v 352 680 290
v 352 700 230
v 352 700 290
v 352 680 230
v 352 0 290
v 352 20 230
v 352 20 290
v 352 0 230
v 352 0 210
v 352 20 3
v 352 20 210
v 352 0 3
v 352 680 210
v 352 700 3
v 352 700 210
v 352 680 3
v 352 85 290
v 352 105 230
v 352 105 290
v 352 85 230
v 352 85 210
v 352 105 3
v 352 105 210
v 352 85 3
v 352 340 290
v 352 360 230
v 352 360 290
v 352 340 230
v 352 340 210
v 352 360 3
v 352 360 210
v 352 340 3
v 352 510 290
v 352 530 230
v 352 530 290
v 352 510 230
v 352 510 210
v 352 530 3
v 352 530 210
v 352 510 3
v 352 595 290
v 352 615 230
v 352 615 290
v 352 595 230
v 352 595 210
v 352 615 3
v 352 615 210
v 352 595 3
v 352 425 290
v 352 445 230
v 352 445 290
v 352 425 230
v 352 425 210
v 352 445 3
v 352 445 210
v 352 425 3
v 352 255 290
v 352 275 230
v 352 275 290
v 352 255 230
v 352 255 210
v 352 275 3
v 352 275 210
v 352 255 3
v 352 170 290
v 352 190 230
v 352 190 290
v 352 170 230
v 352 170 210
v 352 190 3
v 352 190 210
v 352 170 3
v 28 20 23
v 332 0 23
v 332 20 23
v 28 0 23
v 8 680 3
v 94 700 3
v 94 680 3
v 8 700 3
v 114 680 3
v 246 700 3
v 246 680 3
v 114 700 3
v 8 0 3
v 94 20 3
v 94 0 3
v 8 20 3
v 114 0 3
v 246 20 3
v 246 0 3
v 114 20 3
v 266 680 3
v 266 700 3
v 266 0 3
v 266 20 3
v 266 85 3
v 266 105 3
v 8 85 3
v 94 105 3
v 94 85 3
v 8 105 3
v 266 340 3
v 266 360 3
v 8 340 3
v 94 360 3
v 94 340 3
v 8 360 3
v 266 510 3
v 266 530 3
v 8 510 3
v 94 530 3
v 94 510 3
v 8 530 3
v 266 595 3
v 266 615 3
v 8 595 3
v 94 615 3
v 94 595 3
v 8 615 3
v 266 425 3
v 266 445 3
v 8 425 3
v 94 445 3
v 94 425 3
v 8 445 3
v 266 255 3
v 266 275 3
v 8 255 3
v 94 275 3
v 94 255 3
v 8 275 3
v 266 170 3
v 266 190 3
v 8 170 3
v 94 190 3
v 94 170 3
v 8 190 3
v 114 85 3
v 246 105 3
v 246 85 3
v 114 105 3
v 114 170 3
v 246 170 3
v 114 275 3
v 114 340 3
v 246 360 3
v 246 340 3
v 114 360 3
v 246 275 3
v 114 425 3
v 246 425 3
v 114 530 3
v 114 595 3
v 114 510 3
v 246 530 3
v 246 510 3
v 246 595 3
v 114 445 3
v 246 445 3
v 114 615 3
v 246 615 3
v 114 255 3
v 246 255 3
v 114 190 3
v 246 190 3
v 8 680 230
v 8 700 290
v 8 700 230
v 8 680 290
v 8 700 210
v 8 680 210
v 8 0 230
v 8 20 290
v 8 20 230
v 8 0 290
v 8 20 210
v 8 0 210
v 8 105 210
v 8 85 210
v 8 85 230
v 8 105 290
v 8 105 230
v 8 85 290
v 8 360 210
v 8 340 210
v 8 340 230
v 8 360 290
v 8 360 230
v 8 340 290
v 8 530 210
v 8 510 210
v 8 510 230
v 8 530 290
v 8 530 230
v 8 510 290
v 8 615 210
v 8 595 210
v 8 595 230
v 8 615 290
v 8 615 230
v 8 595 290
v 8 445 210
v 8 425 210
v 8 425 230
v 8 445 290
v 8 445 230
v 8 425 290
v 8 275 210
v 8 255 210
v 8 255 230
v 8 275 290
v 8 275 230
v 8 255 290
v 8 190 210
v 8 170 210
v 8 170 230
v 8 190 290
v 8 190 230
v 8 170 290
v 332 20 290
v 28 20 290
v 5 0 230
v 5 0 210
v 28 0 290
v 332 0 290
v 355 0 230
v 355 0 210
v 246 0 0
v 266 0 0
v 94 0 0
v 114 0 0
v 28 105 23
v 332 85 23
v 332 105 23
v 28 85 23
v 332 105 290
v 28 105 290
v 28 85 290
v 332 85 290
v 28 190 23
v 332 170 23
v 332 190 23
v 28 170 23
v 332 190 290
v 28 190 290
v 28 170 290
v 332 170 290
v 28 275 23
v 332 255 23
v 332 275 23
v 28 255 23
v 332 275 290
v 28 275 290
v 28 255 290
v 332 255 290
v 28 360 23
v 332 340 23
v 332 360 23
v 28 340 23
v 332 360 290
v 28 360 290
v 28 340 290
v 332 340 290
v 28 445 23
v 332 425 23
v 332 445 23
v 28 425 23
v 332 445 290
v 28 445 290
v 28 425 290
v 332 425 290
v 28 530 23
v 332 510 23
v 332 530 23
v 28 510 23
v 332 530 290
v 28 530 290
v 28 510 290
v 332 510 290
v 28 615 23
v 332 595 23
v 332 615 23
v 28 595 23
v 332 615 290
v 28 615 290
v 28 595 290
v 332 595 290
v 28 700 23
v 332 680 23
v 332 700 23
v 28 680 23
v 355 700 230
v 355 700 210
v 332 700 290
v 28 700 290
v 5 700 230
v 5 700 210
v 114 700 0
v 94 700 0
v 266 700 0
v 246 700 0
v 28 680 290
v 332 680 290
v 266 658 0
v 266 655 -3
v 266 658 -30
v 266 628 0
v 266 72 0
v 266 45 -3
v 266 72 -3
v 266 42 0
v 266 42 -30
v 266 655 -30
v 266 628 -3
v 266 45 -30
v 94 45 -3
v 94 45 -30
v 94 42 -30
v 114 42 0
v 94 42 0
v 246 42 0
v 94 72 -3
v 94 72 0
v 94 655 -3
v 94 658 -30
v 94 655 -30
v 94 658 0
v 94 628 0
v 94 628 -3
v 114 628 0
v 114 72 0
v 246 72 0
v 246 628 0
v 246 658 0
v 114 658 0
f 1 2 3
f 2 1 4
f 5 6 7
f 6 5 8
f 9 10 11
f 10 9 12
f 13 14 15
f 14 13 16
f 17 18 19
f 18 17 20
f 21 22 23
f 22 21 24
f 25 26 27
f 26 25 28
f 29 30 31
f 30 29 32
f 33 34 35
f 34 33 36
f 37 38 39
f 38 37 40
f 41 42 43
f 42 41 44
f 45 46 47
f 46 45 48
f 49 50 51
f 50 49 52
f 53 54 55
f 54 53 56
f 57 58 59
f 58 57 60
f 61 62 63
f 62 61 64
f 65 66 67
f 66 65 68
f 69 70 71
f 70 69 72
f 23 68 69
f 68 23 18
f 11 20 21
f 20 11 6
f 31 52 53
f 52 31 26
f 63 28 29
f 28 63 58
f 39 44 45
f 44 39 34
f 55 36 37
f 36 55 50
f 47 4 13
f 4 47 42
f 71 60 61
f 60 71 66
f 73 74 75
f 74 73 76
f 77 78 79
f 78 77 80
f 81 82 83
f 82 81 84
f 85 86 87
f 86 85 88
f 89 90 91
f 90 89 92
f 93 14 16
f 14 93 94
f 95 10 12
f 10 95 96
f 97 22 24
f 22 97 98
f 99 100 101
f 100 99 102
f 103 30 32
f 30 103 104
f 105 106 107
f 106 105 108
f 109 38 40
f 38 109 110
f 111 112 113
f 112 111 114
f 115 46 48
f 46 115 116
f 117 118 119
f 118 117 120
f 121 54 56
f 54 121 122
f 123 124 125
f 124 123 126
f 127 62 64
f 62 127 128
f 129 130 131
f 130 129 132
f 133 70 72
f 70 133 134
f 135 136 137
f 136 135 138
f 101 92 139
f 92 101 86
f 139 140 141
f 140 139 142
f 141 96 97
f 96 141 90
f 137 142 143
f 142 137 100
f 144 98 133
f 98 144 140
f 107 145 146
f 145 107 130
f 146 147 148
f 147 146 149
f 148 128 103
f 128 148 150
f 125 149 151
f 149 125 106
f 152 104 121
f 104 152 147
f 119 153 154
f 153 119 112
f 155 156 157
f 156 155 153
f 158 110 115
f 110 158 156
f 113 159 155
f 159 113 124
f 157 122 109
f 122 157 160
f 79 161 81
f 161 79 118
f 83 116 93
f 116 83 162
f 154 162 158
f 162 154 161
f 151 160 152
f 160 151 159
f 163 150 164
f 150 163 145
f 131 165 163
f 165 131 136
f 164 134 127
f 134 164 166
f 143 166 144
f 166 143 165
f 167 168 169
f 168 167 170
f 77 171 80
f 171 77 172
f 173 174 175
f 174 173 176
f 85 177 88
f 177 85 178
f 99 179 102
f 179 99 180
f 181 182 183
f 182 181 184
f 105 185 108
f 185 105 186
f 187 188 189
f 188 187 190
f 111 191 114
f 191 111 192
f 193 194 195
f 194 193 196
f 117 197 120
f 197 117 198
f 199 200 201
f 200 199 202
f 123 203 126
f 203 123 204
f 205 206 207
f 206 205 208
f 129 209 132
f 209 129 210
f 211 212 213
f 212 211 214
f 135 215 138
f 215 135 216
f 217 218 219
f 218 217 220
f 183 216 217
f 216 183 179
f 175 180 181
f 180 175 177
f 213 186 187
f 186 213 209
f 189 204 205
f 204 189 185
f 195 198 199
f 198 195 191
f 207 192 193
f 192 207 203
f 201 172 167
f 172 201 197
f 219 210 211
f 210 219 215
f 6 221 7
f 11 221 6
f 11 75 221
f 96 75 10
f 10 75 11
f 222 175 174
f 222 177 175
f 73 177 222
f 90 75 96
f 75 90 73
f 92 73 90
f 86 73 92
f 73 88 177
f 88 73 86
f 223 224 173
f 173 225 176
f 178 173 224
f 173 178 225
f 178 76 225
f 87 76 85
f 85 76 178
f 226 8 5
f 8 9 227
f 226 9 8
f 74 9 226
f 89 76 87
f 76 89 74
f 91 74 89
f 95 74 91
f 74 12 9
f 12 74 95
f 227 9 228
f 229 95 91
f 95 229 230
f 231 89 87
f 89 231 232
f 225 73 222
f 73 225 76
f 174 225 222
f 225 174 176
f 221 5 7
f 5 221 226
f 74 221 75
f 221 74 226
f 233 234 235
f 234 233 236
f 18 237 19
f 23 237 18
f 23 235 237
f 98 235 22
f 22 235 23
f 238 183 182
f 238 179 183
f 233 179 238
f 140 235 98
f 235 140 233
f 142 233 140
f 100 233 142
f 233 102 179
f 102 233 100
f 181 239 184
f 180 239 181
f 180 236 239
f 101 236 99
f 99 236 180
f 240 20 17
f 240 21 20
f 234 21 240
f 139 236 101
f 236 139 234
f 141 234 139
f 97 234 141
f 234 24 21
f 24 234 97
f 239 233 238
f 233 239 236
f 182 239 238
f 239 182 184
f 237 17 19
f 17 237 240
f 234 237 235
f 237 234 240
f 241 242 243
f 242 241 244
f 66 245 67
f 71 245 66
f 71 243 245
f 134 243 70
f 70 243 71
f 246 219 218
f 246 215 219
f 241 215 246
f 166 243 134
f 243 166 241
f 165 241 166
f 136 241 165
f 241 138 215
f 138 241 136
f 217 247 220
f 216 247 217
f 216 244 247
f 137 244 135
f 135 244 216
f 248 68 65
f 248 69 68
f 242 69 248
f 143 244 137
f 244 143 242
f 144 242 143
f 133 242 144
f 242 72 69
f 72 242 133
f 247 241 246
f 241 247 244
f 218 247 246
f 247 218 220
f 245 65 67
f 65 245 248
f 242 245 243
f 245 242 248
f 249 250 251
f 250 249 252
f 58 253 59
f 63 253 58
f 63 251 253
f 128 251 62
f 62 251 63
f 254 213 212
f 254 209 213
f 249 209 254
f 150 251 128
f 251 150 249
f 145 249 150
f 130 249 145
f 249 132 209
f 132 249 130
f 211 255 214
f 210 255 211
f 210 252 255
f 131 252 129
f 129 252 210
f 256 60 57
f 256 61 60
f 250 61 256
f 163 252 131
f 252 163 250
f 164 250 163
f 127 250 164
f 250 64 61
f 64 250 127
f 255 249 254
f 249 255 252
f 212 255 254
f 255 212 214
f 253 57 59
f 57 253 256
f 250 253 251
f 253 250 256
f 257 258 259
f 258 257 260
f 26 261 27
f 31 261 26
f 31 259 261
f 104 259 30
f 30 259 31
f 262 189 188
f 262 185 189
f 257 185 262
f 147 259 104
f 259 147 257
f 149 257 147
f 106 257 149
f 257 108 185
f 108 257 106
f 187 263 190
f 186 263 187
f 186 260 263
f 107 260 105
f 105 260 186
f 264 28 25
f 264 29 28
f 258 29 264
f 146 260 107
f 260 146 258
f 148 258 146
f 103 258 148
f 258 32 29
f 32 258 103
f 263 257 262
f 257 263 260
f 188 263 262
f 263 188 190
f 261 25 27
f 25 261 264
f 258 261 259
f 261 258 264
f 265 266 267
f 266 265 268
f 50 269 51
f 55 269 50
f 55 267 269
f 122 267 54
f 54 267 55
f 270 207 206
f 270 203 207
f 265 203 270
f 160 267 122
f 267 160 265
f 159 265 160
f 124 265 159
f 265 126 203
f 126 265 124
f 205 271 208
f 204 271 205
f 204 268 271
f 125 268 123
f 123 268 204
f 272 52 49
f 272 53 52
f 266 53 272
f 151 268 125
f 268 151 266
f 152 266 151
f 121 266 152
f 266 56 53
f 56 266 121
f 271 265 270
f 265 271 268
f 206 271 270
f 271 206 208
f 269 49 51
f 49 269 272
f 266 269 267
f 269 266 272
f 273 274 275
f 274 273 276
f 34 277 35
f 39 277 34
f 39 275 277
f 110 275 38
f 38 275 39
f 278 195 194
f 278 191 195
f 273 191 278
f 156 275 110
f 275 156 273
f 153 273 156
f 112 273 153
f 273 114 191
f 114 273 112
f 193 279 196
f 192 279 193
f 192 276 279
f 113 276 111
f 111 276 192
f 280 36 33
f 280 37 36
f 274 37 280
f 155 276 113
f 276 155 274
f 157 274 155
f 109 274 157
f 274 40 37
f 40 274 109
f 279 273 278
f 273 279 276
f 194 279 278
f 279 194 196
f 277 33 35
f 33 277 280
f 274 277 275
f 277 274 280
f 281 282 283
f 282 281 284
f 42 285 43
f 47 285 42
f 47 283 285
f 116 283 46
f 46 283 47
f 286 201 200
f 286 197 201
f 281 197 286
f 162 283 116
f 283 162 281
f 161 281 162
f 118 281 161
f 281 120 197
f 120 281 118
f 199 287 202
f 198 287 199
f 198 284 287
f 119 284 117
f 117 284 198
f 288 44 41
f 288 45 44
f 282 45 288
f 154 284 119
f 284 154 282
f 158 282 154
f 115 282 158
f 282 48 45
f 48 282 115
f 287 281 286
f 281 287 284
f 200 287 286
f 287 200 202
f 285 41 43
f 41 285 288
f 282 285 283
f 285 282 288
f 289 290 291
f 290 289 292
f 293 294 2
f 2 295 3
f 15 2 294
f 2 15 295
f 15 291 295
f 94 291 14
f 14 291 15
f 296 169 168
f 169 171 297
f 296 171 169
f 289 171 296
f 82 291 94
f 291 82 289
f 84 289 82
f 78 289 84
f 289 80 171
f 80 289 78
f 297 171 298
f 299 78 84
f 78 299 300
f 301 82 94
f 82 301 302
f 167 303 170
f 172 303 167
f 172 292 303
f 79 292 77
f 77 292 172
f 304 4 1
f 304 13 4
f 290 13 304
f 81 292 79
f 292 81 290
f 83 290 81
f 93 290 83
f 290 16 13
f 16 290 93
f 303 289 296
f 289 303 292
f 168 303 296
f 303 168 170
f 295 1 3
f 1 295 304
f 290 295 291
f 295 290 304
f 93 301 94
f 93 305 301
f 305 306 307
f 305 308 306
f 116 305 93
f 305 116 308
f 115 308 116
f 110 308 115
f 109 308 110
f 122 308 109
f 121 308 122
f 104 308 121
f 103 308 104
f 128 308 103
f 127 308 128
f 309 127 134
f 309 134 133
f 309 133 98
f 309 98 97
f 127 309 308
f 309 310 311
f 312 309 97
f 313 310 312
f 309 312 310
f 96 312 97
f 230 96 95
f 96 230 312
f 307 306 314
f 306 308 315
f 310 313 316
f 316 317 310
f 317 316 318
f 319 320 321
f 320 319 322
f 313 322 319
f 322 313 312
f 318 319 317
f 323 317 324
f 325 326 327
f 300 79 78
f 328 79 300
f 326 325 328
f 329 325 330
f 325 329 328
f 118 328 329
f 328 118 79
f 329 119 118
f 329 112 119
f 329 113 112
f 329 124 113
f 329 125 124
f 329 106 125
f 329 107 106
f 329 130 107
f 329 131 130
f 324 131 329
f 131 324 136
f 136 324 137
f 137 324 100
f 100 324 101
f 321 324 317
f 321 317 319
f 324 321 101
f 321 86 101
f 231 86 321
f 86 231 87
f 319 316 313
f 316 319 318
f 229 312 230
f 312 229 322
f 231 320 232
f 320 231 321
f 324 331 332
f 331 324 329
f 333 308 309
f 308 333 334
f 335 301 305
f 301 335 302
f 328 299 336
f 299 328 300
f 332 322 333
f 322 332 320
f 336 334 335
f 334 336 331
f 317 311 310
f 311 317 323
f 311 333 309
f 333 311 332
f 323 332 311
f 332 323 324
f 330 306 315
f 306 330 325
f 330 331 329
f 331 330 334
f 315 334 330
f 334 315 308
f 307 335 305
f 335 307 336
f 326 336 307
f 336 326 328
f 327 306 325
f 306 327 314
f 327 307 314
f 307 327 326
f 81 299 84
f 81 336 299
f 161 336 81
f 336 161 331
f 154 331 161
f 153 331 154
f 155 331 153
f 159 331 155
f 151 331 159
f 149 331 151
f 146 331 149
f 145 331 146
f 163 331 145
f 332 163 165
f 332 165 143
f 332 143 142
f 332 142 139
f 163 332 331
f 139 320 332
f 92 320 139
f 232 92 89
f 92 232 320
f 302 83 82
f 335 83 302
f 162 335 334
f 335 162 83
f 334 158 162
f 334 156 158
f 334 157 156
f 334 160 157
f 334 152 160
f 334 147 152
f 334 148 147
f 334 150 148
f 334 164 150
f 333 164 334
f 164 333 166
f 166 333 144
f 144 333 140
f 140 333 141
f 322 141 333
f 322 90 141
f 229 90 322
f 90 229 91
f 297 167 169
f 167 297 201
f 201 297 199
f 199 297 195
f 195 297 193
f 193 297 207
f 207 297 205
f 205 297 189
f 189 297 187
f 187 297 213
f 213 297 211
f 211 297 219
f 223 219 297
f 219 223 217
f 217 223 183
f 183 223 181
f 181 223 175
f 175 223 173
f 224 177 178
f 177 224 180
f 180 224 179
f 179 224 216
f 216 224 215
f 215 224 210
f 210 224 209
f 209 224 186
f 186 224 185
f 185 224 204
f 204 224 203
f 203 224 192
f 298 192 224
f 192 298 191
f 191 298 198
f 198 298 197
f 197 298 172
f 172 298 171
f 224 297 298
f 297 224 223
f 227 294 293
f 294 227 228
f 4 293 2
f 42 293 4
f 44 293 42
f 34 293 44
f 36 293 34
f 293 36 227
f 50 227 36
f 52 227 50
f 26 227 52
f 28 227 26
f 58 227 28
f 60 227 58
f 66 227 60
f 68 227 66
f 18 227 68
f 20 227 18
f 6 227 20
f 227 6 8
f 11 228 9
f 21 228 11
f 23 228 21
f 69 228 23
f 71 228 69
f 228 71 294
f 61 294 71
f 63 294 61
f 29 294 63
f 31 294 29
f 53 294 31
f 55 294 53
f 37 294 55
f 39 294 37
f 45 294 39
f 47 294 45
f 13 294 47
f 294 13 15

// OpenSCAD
// file: ../../library/profiles.scad
module lShapeProfile($length, $size, $thickness) {
    cube([$length, $size, $thickness]);
    rotate([90, 0, 0])
    translate([0, 0, -$thickness]) cube([$length, $size, $thickness]);
}


module uShapeProfile($length, $size, $thickness) {
    cube([$length, $size, $thickness]);
    rotate([90, 0, 0])
    translate([0, 0, -$thickness]) cube([$length, $size, $thickness]);

    translate([0, $size, 0])
    rotate([90, 0, 0])
    cube([$length, $size, $thickness]);
}


module squareTubeProfile($length, $size, $thickness) {
    cube([$length, $size, $thickness]);

    rotate([90, 0, 0])
    translate([0, 0, -$thickness])
    cube([$length, $size, $thickness]);

    translate([0, $size, 0])
    rotate([90, 0, 0])
    cube([$length, $size, $thickness]);

    translate([0, 0, $size - $thickness])
    cube([$length, $size, $thickness]);
}
// file: fireBasket.scad
include <./config.scad>
include <../../library/profiles.scad>


basketClearance = 5;
basketFlatIron = 3;
totalClearance = basketClearance + basketFlatIron;
basketFrameGap = 60;
basketProfileSize = profileSize / 2;
basketWidth = fireBasketWidth - (profileSize) - (totalClearance * 2);
basketHeight = fireBasketHeight + (profileSize);

// calculations
idealGap = basketFrameGap + basketProfileSize;
numRips = floor(outerDepth / idealGap);
ripGap = (outerDepth - basketProfileSize) / numRips;


filletWidth = basketWidth - (basketProfileSize * 2) - (totalClearance * 2);
numFillet = floor((filletWidth) / idealGap);
filletGap = (filletWidth - basketProfileSize ) / numFillet;



module fireBasketPartsList() {
    // FireBasket
    echo(str("Nr,Beschreibung,Stück,Länge,Breite,Höhe"));

    echo(str("60,Feuerkorb Seitlich - Vierkantrohr,", numRips * 2, ",", basketHeight - basketFlatIron, ",", basketProfileSize, ",", basketProfileSize));
    echo(str("61,Feuerkorb Unten - Vierkantrohr ,", numRips, ",", basketWidth, ",", basketProfileSize, ",", basketProfileSize));
    echo(str("62,Fillets Vorne und Hinten - Vierkantrohr ,", (numFillet+1) * 2, ",", basketHeight - basketFlatIron - basketProfileSize, ",", basketProfileSize, ",", basketProfileSize));
    echo(str("63,Flachstahl lang ,", 4, ",", outerDepth, ",", basketProfileSize, ",", basketFlatIron));
    echo(str("64,Flachstahl kurz ,", 2, ",", basketWidth + (basketFlatIron * 2), ",", basketProfileSize, ",", basketFlatIron));
    echo(str("64,Winkelprofil - Fixierung ,", 2, ",", basketWidth, ",", 30, ",", 30));
}

module fireBasket() {


    module basketFrame() {

        cube(size = [basketWidth, basketProfileSize, basketProfileSize]);
        cube(size = [basketProfileSize, basketProfileSize, basketHeight - basketFlatIron]);

        translate([basketWidth - basketProfileSize, 0, 0])
        cube(size = [basketProfileSize, basketProfileSize, basketHeight - basketFlatIron]);
    }

    module fillet() {
        translate([0, 0, basketProfileSize])
        cube(size = [basketProfileSize, basketProfileSize, basketHeight - basketFlatIron - basketProfileSize]);
    }


    translate([totalClearance, 0, basketFlatIron]){
        // all frames
        for ( i = [0 : numRips] ){
            stepMove = i * ripGap;
            translate([0, stepMove, 0])
            basketFrame();
        }

        if (!fireBasketFrontOpen) {
            // back fillets
            for ( i = [1 : numFillet] ){
                stepMove = (i * filletGap) + basketProfileSize - (basketProfileSize * 1.5);
                translate([stepMove, 0, 0])
                fillet();
            }

            translate([0, outerDepth - basketProfileSize, 0])
            for ( i = [1 : numFillet] ){
                stepMove = (i * filletGap) + basketProfileSize - (basketProfileSize * 1.5);
                translate([stepMove, 0, 0])
                fillet();
            }
        }

        // flat iron below
        translate([(basketWidth / 4), 0, - basketFlatIron])
        cube(size = [basketProfileSize, outerDepth, basketFlatIron]);
        translate([(basketWidth / 4 * 3) - basketProfileSize, 0, - basketFlatIron])
        cube(size = [basketProfileSize, outerDepth, basketFlatIron]);


        // flat iron sides
        translate([- basketFlatIron, 0, fireBasketHeight - basketFlatIron - (basketProfileSize * 2)])
        cube(size = [basketFlatIron, outerDepth, basketProfileSize]);
        translate([basketWidth, 0, fireBasketHeight - basketFlatIron - (basketProfileSize * 2)])
        cube(size = [basketFlatIron, outerDepth, basketProfileSize]);

        // fixation
        translate([basketWidth / 4, profileSize + 2, - basketFlatIron])
        rotate([-90, 0, 0])
        lShapeProfile(basketWidth / 2, 30, 3);

        translate([basketWidth / 4, outerDepth - profileSize - 2, - basketFlatIron])
        rotate([180, 0, 0])
        lShapeProfile(basketWidth / 2, 30, 3);



        if (!fireBasketFrontOpen) {
            // flat iron front and back
            translate([-basketFlatIron, -basketFlatIron, fireBasketHeight - basketFlatIron - (basketProfileSize * 2)])
            cube(size = [basketWidth + (basketFlatIron * 2), basketFlatIron, basketProfileSize]);
            // flat iron front and back
            translate([-basketFlatIron, outerDepth, fireBasketHeight - basketFlatIron - (basketProfileSize * 2)])
            cube(size = [basketWidth + (basketFlatIron * 2), basketFlatIron, basketProfileSize]);
        }
    }

}
// file: config.scad
drawReferences = false;
drawReferenceWall = true;

outerWidth = 1500;
outerDepth = 700;
outerHeight = 700;

profileSize = 40;

fireBasketHeight = 250;
fireBasketWidth = 400;
fireBasketGroundClearance = 100;
fireBasketFrontOpen = true;

spindleDiameter  = 20;
spindleOverlength = 5;
spindleWallExtension = 140;
spindleWheelDiameter = 200;
spindlePlateThickness = 5;
spindlePlateGap = 2;
spindleHandleThickness = 8;

grateGap = 4;
grateSize = 30;
grateProfileThickness = 3;

lineThickness = 1;
lineGap = 80;
textSize = 20;

$fn = 120;
// main file
include <./config.scad>

use <./fireBasket.scad>


color([75/255, 70/255, 255/255])
fireBasket();


// start csv header
fireBasketPartsList();
